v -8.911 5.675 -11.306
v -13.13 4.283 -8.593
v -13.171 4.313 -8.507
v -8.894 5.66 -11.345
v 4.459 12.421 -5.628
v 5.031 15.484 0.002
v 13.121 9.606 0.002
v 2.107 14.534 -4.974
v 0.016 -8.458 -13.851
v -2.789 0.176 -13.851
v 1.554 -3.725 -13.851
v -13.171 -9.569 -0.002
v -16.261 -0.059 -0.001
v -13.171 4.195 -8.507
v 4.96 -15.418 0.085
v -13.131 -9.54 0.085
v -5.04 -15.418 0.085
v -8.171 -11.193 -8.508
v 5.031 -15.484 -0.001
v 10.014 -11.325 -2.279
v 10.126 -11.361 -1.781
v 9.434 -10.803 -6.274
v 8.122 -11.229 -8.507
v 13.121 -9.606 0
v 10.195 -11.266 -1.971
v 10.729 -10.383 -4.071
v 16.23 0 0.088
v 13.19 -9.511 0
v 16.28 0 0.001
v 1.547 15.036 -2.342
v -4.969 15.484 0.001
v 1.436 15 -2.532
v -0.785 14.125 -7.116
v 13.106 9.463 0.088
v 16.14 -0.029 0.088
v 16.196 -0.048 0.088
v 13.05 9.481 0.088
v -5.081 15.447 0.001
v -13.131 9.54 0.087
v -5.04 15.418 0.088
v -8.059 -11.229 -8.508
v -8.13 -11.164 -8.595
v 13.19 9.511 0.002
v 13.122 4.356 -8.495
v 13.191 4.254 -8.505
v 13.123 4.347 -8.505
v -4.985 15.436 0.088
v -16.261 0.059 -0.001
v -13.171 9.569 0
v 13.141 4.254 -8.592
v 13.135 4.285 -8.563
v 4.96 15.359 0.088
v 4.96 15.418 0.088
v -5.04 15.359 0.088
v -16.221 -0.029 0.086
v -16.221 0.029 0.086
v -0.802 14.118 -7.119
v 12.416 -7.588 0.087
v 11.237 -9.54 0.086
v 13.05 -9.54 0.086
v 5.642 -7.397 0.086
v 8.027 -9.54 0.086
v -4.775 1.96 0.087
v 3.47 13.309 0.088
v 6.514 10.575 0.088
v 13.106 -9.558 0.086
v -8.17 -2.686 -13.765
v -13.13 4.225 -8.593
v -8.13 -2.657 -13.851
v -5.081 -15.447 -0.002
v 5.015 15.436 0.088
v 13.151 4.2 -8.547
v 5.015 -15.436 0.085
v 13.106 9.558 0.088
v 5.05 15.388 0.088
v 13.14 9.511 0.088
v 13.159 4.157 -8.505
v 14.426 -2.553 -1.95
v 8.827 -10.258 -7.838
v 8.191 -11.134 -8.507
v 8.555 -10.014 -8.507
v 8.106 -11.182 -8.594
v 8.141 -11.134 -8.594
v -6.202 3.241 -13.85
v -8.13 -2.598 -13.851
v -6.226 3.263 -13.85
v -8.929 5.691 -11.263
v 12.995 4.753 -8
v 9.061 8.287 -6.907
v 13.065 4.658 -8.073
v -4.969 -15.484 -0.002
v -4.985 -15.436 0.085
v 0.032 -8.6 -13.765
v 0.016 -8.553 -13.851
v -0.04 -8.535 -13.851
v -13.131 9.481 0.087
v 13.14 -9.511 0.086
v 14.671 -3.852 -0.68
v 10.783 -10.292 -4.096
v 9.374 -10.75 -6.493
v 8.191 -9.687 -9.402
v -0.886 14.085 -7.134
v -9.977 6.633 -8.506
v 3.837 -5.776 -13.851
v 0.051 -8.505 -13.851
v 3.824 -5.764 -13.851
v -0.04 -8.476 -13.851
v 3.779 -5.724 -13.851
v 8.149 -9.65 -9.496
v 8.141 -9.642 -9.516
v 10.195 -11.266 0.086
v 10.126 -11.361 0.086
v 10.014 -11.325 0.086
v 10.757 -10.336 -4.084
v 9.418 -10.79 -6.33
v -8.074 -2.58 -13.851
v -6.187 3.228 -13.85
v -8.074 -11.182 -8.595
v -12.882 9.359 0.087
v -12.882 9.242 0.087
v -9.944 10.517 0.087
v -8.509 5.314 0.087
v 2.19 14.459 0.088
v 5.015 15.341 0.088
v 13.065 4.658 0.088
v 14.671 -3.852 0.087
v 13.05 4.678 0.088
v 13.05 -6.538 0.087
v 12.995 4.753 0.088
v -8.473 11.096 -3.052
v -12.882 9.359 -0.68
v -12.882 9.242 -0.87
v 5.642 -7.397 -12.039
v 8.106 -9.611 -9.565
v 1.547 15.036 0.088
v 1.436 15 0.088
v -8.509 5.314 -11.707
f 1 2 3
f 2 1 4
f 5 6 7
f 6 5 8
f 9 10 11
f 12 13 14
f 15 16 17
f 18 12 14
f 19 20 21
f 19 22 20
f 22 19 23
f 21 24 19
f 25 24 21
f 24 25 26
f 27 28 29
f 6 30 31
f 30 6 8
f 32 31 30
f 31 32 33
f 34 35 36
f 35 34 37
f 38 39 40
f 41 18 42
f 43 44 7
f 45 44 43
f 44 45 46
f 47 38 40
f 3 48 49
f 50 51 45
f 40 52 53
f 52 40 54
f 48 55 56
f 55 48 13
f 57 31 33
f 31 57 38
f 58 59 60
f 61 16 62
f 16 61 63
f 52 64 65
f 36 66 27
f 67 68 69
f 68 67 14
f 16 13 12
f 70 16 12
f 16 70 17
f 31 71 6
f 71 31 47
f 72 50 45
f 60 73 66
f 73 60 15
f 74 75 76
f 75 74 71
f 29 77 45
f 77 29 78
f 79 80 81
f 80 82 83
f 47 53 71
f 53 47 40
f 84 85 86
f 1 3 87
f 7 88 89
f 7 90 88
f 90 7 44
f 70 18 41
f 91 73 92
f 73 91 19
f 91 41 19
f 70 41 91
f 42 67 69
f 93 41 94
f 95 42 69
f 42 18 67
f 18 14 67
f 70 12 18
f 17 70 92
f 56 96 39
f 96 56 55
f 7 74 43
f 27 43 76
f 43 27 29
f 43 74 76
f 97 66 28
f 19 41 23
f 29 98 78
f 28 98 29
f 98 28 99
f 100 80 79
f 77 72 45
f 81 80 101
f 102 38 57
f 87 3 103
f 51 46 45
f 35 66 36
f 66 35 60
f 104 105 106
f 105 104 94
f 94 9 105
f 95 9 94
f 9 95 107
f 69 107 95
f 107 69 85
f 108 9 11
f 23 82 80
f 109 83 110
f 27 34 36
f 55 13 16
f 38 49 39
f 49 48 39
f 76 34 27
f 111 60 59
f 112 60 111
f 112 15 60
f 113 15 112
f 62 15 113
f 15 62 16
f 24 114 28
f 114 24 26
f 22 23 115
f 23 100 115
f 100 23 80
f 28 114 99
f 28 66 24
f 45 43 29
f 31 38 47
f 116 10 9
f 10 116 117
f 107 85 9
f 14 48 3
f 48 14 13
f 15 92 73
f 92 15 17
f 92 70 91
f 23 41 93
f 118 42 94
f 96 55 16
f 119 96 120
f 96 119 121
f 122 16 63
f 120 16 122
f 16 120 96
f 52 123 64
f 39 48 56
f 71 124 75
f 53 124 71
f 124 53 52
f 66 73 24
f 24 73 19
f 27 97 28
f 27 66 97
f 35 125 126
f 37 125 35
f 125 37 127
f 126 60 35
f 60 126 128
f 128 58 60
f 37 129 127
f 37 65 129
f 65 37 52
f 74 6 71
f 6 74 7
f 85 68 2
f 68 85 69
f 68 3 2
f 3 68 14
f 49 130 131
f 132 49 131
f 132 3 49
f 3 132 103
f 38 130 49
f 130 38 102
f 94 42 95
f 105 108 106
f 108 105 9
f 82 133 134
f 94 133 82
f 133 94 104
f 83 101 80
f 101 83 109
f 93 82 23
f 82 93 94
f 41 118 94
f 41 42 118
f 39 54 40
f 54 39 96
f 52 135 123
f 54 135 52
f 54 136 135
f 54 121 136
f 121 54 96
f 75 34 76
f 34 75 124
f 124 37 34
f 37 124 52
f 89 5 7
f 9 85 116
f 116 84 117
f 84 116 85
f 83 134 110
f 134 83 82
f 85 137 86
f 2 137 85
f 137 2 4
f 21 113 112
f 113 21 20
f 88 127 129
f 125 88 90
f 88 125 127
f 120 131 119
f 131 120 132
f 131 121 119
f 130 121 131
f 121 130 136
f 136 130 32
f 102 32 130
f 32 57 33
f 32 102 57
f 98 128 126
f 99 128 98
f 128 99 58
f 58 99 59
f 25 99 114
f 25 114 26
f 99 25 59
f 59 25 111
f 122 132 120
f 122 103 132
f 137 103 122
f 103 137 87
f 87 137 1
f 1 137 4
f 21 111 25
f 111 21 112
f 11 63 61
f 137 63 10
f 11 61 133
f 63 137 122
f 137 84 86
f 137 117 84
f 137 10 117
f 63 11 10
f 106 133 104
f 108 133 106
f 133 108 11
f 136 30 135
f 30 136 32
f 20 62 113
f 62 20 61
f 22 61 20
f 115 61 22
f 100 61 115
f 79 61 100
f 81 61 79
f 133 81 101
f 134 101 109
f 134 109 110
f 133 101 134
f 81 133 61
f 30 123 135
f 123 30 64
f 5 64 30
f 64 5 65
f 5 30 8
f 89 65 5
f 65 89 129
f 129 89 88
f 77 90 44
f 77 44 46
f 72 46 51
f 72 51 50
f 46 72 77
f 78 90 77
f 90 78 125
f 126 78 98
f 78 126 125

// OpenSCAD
// Auto-generated OpenSCAD file

    inner_points = 10*[[-1.2800868421421776, 0.9300375234937233, -0.4999999999986175], [1.00952842451697, -1.126609720368595, 0.4999999999986175], [0.7495811565537936, 0.25032633822332373, -1.309016994373636], [0.5889249096677321, 1.1013196227617108, 0.8090169943779234], [-0.39522647677644196, 1.2786499601524015, -0.8090169943722536], [-1.2800868421428393, 0.930037523491642, 0.5000000000013824], [-0.8428092367899453, 0.5372528513524985, -1.309016994374093], [1.4571111845311355, -0.3852126115666106, 4.568012634820207e-13], [0.572250819164738, -0.7338250482273702, 1.309016994374093], [1.0095284245176321, -1.1266097203665137, -0.5000000000013824], [0.15164730431657092, 1.494104294906303, 3.5040581547463034e-12], [-0.3952264767775129, 1.2786499601490338, 0.8090169943776411], [1.2964549376461445, 0.46578067297514414, 0.5000000000021215], [0.7495811565520609, 0.25032633821787476, 1.3090169943762586], [0.5889249096688031, 1.1013196227650786, -0.8090169943719714], [-0.8428092367916781, 0.5372528513470497, 1.3090169943758017], [-0.13527920881153285, -0.09828609843406824, -1.6180339887498947], [1.2964549376468066, 0.4657806729772256, -0.49999999999787836], [-0.13527920881367453, -0.09828609844080341, 1.6180339887498947], [0.5722508191664707, -0.7338250482219214, -1.3090169943758017]];

    outer_points = 10*[[1.6180339861193813, 0.0, 9.226332282866825e-05], [-1.6180339861193813, 0.0, -9.226332282866825e-05], [4.8497926242127776e-05, 1.3764661599662604, -0.8505144895094868], [7.848867363894099e-05, -0.850514490892208, -1.3764661577284751], [1.3090654955439587, 0.4254096483352815, -0.8505340370787032], [1.3090169976177166, -0.9510565116309789, -1.9547569216365145e-05], [1.309016986875918, 0.9510565116309789, 0.00016883276146815448], [-1.308968488949676, 0.4254096483352815, -0.850683322270955], [-1.309016986875918, -0.9510565116309789, -0.00016883276146815448], [-1.3090169976177166, 0.9510565116309789, 1.9547569216365145e-05], [0.8090954784139313, -0.2627292414823533, -1.3763618133434734], [0.8090655050471297, -1.113432112705552, -0.8507149509023446], [-0.8089385077054501, -0.2627292414823533, -1.3764540766663023], [-0.8089684810722516, -1.113432112705552, -0.8508072142251732], [0.5000784791704679, 0.6883272701486257, -1.3762852439048336], [0.5000000078774243, -1.5388417610408336, -0.00012389195421817631], [0.49999999049682897, 1.5388417610408336, 0.00018091382364129736], [-0.4999215192037853, 0.6883272701486257, -1.3763422657742568], [-0.49999999049682897, -1.5388417610408336, -0.00018091382364129736], [-0.5000000078774243, 1.5388417610408336, 0.00012389195421817631]];

    // Convex hull for inner set (I)
    module inner_hull() {
        hull() {
            for (p = inner_points) {
                translate(p) sphere(r=0.1);
            }
        }
    }

    // Convex hull for outer set (O) minus inner hull (O \ I)
    module outer_minus_inner() {
        difference() {
            hull() {
                for (p = outer_points) {
                    translate(p) sphere(r=0.1);
                }
            }
            inner_hull(); // Subtract inner hull
        }
    }

    // Convex hull for outer set (O) minus all translated inner hulls
    module outer_minus_AllTranslationInner() {
        difference() {
            hull() {
                for (p = outer_points) {
                    translate(p) sphere(r=0.1);
                }
            }
            hull() {
                translate([0,0,50]) inner_hull();
                translate([0,0,-50]) inner_hull();
            }; // Subtract translated inner hulls
        }
    }

    // Difference between outer_minus_inner and outer_minus_AllTranslationInner
    module outer_minus_inner_diff() {
        difference() {
            // Outer minus inner
            difference() {
                hull() {
                    for (p = outer_points) {
                        translate(p) sphere(r=0.1);
                    }
                }
                inner_hull();
            }

            // Subtract Outer minus AllTranslationInner
            difference() {
                hull() {
                    for (p = outer_points) {
                        translate(p) sphere(r=0.1);
                    }
                }
                hull() {
                    translate([0,0,50]) inner_hull();
                    translate([0,0,-50]) inner_hull();
                };
            }
        }
    }

    // Rendering all with colors applied
    color([0, 1, 0, 1]) outer_minus_AllTranslationInner(); // Opaque green
    
